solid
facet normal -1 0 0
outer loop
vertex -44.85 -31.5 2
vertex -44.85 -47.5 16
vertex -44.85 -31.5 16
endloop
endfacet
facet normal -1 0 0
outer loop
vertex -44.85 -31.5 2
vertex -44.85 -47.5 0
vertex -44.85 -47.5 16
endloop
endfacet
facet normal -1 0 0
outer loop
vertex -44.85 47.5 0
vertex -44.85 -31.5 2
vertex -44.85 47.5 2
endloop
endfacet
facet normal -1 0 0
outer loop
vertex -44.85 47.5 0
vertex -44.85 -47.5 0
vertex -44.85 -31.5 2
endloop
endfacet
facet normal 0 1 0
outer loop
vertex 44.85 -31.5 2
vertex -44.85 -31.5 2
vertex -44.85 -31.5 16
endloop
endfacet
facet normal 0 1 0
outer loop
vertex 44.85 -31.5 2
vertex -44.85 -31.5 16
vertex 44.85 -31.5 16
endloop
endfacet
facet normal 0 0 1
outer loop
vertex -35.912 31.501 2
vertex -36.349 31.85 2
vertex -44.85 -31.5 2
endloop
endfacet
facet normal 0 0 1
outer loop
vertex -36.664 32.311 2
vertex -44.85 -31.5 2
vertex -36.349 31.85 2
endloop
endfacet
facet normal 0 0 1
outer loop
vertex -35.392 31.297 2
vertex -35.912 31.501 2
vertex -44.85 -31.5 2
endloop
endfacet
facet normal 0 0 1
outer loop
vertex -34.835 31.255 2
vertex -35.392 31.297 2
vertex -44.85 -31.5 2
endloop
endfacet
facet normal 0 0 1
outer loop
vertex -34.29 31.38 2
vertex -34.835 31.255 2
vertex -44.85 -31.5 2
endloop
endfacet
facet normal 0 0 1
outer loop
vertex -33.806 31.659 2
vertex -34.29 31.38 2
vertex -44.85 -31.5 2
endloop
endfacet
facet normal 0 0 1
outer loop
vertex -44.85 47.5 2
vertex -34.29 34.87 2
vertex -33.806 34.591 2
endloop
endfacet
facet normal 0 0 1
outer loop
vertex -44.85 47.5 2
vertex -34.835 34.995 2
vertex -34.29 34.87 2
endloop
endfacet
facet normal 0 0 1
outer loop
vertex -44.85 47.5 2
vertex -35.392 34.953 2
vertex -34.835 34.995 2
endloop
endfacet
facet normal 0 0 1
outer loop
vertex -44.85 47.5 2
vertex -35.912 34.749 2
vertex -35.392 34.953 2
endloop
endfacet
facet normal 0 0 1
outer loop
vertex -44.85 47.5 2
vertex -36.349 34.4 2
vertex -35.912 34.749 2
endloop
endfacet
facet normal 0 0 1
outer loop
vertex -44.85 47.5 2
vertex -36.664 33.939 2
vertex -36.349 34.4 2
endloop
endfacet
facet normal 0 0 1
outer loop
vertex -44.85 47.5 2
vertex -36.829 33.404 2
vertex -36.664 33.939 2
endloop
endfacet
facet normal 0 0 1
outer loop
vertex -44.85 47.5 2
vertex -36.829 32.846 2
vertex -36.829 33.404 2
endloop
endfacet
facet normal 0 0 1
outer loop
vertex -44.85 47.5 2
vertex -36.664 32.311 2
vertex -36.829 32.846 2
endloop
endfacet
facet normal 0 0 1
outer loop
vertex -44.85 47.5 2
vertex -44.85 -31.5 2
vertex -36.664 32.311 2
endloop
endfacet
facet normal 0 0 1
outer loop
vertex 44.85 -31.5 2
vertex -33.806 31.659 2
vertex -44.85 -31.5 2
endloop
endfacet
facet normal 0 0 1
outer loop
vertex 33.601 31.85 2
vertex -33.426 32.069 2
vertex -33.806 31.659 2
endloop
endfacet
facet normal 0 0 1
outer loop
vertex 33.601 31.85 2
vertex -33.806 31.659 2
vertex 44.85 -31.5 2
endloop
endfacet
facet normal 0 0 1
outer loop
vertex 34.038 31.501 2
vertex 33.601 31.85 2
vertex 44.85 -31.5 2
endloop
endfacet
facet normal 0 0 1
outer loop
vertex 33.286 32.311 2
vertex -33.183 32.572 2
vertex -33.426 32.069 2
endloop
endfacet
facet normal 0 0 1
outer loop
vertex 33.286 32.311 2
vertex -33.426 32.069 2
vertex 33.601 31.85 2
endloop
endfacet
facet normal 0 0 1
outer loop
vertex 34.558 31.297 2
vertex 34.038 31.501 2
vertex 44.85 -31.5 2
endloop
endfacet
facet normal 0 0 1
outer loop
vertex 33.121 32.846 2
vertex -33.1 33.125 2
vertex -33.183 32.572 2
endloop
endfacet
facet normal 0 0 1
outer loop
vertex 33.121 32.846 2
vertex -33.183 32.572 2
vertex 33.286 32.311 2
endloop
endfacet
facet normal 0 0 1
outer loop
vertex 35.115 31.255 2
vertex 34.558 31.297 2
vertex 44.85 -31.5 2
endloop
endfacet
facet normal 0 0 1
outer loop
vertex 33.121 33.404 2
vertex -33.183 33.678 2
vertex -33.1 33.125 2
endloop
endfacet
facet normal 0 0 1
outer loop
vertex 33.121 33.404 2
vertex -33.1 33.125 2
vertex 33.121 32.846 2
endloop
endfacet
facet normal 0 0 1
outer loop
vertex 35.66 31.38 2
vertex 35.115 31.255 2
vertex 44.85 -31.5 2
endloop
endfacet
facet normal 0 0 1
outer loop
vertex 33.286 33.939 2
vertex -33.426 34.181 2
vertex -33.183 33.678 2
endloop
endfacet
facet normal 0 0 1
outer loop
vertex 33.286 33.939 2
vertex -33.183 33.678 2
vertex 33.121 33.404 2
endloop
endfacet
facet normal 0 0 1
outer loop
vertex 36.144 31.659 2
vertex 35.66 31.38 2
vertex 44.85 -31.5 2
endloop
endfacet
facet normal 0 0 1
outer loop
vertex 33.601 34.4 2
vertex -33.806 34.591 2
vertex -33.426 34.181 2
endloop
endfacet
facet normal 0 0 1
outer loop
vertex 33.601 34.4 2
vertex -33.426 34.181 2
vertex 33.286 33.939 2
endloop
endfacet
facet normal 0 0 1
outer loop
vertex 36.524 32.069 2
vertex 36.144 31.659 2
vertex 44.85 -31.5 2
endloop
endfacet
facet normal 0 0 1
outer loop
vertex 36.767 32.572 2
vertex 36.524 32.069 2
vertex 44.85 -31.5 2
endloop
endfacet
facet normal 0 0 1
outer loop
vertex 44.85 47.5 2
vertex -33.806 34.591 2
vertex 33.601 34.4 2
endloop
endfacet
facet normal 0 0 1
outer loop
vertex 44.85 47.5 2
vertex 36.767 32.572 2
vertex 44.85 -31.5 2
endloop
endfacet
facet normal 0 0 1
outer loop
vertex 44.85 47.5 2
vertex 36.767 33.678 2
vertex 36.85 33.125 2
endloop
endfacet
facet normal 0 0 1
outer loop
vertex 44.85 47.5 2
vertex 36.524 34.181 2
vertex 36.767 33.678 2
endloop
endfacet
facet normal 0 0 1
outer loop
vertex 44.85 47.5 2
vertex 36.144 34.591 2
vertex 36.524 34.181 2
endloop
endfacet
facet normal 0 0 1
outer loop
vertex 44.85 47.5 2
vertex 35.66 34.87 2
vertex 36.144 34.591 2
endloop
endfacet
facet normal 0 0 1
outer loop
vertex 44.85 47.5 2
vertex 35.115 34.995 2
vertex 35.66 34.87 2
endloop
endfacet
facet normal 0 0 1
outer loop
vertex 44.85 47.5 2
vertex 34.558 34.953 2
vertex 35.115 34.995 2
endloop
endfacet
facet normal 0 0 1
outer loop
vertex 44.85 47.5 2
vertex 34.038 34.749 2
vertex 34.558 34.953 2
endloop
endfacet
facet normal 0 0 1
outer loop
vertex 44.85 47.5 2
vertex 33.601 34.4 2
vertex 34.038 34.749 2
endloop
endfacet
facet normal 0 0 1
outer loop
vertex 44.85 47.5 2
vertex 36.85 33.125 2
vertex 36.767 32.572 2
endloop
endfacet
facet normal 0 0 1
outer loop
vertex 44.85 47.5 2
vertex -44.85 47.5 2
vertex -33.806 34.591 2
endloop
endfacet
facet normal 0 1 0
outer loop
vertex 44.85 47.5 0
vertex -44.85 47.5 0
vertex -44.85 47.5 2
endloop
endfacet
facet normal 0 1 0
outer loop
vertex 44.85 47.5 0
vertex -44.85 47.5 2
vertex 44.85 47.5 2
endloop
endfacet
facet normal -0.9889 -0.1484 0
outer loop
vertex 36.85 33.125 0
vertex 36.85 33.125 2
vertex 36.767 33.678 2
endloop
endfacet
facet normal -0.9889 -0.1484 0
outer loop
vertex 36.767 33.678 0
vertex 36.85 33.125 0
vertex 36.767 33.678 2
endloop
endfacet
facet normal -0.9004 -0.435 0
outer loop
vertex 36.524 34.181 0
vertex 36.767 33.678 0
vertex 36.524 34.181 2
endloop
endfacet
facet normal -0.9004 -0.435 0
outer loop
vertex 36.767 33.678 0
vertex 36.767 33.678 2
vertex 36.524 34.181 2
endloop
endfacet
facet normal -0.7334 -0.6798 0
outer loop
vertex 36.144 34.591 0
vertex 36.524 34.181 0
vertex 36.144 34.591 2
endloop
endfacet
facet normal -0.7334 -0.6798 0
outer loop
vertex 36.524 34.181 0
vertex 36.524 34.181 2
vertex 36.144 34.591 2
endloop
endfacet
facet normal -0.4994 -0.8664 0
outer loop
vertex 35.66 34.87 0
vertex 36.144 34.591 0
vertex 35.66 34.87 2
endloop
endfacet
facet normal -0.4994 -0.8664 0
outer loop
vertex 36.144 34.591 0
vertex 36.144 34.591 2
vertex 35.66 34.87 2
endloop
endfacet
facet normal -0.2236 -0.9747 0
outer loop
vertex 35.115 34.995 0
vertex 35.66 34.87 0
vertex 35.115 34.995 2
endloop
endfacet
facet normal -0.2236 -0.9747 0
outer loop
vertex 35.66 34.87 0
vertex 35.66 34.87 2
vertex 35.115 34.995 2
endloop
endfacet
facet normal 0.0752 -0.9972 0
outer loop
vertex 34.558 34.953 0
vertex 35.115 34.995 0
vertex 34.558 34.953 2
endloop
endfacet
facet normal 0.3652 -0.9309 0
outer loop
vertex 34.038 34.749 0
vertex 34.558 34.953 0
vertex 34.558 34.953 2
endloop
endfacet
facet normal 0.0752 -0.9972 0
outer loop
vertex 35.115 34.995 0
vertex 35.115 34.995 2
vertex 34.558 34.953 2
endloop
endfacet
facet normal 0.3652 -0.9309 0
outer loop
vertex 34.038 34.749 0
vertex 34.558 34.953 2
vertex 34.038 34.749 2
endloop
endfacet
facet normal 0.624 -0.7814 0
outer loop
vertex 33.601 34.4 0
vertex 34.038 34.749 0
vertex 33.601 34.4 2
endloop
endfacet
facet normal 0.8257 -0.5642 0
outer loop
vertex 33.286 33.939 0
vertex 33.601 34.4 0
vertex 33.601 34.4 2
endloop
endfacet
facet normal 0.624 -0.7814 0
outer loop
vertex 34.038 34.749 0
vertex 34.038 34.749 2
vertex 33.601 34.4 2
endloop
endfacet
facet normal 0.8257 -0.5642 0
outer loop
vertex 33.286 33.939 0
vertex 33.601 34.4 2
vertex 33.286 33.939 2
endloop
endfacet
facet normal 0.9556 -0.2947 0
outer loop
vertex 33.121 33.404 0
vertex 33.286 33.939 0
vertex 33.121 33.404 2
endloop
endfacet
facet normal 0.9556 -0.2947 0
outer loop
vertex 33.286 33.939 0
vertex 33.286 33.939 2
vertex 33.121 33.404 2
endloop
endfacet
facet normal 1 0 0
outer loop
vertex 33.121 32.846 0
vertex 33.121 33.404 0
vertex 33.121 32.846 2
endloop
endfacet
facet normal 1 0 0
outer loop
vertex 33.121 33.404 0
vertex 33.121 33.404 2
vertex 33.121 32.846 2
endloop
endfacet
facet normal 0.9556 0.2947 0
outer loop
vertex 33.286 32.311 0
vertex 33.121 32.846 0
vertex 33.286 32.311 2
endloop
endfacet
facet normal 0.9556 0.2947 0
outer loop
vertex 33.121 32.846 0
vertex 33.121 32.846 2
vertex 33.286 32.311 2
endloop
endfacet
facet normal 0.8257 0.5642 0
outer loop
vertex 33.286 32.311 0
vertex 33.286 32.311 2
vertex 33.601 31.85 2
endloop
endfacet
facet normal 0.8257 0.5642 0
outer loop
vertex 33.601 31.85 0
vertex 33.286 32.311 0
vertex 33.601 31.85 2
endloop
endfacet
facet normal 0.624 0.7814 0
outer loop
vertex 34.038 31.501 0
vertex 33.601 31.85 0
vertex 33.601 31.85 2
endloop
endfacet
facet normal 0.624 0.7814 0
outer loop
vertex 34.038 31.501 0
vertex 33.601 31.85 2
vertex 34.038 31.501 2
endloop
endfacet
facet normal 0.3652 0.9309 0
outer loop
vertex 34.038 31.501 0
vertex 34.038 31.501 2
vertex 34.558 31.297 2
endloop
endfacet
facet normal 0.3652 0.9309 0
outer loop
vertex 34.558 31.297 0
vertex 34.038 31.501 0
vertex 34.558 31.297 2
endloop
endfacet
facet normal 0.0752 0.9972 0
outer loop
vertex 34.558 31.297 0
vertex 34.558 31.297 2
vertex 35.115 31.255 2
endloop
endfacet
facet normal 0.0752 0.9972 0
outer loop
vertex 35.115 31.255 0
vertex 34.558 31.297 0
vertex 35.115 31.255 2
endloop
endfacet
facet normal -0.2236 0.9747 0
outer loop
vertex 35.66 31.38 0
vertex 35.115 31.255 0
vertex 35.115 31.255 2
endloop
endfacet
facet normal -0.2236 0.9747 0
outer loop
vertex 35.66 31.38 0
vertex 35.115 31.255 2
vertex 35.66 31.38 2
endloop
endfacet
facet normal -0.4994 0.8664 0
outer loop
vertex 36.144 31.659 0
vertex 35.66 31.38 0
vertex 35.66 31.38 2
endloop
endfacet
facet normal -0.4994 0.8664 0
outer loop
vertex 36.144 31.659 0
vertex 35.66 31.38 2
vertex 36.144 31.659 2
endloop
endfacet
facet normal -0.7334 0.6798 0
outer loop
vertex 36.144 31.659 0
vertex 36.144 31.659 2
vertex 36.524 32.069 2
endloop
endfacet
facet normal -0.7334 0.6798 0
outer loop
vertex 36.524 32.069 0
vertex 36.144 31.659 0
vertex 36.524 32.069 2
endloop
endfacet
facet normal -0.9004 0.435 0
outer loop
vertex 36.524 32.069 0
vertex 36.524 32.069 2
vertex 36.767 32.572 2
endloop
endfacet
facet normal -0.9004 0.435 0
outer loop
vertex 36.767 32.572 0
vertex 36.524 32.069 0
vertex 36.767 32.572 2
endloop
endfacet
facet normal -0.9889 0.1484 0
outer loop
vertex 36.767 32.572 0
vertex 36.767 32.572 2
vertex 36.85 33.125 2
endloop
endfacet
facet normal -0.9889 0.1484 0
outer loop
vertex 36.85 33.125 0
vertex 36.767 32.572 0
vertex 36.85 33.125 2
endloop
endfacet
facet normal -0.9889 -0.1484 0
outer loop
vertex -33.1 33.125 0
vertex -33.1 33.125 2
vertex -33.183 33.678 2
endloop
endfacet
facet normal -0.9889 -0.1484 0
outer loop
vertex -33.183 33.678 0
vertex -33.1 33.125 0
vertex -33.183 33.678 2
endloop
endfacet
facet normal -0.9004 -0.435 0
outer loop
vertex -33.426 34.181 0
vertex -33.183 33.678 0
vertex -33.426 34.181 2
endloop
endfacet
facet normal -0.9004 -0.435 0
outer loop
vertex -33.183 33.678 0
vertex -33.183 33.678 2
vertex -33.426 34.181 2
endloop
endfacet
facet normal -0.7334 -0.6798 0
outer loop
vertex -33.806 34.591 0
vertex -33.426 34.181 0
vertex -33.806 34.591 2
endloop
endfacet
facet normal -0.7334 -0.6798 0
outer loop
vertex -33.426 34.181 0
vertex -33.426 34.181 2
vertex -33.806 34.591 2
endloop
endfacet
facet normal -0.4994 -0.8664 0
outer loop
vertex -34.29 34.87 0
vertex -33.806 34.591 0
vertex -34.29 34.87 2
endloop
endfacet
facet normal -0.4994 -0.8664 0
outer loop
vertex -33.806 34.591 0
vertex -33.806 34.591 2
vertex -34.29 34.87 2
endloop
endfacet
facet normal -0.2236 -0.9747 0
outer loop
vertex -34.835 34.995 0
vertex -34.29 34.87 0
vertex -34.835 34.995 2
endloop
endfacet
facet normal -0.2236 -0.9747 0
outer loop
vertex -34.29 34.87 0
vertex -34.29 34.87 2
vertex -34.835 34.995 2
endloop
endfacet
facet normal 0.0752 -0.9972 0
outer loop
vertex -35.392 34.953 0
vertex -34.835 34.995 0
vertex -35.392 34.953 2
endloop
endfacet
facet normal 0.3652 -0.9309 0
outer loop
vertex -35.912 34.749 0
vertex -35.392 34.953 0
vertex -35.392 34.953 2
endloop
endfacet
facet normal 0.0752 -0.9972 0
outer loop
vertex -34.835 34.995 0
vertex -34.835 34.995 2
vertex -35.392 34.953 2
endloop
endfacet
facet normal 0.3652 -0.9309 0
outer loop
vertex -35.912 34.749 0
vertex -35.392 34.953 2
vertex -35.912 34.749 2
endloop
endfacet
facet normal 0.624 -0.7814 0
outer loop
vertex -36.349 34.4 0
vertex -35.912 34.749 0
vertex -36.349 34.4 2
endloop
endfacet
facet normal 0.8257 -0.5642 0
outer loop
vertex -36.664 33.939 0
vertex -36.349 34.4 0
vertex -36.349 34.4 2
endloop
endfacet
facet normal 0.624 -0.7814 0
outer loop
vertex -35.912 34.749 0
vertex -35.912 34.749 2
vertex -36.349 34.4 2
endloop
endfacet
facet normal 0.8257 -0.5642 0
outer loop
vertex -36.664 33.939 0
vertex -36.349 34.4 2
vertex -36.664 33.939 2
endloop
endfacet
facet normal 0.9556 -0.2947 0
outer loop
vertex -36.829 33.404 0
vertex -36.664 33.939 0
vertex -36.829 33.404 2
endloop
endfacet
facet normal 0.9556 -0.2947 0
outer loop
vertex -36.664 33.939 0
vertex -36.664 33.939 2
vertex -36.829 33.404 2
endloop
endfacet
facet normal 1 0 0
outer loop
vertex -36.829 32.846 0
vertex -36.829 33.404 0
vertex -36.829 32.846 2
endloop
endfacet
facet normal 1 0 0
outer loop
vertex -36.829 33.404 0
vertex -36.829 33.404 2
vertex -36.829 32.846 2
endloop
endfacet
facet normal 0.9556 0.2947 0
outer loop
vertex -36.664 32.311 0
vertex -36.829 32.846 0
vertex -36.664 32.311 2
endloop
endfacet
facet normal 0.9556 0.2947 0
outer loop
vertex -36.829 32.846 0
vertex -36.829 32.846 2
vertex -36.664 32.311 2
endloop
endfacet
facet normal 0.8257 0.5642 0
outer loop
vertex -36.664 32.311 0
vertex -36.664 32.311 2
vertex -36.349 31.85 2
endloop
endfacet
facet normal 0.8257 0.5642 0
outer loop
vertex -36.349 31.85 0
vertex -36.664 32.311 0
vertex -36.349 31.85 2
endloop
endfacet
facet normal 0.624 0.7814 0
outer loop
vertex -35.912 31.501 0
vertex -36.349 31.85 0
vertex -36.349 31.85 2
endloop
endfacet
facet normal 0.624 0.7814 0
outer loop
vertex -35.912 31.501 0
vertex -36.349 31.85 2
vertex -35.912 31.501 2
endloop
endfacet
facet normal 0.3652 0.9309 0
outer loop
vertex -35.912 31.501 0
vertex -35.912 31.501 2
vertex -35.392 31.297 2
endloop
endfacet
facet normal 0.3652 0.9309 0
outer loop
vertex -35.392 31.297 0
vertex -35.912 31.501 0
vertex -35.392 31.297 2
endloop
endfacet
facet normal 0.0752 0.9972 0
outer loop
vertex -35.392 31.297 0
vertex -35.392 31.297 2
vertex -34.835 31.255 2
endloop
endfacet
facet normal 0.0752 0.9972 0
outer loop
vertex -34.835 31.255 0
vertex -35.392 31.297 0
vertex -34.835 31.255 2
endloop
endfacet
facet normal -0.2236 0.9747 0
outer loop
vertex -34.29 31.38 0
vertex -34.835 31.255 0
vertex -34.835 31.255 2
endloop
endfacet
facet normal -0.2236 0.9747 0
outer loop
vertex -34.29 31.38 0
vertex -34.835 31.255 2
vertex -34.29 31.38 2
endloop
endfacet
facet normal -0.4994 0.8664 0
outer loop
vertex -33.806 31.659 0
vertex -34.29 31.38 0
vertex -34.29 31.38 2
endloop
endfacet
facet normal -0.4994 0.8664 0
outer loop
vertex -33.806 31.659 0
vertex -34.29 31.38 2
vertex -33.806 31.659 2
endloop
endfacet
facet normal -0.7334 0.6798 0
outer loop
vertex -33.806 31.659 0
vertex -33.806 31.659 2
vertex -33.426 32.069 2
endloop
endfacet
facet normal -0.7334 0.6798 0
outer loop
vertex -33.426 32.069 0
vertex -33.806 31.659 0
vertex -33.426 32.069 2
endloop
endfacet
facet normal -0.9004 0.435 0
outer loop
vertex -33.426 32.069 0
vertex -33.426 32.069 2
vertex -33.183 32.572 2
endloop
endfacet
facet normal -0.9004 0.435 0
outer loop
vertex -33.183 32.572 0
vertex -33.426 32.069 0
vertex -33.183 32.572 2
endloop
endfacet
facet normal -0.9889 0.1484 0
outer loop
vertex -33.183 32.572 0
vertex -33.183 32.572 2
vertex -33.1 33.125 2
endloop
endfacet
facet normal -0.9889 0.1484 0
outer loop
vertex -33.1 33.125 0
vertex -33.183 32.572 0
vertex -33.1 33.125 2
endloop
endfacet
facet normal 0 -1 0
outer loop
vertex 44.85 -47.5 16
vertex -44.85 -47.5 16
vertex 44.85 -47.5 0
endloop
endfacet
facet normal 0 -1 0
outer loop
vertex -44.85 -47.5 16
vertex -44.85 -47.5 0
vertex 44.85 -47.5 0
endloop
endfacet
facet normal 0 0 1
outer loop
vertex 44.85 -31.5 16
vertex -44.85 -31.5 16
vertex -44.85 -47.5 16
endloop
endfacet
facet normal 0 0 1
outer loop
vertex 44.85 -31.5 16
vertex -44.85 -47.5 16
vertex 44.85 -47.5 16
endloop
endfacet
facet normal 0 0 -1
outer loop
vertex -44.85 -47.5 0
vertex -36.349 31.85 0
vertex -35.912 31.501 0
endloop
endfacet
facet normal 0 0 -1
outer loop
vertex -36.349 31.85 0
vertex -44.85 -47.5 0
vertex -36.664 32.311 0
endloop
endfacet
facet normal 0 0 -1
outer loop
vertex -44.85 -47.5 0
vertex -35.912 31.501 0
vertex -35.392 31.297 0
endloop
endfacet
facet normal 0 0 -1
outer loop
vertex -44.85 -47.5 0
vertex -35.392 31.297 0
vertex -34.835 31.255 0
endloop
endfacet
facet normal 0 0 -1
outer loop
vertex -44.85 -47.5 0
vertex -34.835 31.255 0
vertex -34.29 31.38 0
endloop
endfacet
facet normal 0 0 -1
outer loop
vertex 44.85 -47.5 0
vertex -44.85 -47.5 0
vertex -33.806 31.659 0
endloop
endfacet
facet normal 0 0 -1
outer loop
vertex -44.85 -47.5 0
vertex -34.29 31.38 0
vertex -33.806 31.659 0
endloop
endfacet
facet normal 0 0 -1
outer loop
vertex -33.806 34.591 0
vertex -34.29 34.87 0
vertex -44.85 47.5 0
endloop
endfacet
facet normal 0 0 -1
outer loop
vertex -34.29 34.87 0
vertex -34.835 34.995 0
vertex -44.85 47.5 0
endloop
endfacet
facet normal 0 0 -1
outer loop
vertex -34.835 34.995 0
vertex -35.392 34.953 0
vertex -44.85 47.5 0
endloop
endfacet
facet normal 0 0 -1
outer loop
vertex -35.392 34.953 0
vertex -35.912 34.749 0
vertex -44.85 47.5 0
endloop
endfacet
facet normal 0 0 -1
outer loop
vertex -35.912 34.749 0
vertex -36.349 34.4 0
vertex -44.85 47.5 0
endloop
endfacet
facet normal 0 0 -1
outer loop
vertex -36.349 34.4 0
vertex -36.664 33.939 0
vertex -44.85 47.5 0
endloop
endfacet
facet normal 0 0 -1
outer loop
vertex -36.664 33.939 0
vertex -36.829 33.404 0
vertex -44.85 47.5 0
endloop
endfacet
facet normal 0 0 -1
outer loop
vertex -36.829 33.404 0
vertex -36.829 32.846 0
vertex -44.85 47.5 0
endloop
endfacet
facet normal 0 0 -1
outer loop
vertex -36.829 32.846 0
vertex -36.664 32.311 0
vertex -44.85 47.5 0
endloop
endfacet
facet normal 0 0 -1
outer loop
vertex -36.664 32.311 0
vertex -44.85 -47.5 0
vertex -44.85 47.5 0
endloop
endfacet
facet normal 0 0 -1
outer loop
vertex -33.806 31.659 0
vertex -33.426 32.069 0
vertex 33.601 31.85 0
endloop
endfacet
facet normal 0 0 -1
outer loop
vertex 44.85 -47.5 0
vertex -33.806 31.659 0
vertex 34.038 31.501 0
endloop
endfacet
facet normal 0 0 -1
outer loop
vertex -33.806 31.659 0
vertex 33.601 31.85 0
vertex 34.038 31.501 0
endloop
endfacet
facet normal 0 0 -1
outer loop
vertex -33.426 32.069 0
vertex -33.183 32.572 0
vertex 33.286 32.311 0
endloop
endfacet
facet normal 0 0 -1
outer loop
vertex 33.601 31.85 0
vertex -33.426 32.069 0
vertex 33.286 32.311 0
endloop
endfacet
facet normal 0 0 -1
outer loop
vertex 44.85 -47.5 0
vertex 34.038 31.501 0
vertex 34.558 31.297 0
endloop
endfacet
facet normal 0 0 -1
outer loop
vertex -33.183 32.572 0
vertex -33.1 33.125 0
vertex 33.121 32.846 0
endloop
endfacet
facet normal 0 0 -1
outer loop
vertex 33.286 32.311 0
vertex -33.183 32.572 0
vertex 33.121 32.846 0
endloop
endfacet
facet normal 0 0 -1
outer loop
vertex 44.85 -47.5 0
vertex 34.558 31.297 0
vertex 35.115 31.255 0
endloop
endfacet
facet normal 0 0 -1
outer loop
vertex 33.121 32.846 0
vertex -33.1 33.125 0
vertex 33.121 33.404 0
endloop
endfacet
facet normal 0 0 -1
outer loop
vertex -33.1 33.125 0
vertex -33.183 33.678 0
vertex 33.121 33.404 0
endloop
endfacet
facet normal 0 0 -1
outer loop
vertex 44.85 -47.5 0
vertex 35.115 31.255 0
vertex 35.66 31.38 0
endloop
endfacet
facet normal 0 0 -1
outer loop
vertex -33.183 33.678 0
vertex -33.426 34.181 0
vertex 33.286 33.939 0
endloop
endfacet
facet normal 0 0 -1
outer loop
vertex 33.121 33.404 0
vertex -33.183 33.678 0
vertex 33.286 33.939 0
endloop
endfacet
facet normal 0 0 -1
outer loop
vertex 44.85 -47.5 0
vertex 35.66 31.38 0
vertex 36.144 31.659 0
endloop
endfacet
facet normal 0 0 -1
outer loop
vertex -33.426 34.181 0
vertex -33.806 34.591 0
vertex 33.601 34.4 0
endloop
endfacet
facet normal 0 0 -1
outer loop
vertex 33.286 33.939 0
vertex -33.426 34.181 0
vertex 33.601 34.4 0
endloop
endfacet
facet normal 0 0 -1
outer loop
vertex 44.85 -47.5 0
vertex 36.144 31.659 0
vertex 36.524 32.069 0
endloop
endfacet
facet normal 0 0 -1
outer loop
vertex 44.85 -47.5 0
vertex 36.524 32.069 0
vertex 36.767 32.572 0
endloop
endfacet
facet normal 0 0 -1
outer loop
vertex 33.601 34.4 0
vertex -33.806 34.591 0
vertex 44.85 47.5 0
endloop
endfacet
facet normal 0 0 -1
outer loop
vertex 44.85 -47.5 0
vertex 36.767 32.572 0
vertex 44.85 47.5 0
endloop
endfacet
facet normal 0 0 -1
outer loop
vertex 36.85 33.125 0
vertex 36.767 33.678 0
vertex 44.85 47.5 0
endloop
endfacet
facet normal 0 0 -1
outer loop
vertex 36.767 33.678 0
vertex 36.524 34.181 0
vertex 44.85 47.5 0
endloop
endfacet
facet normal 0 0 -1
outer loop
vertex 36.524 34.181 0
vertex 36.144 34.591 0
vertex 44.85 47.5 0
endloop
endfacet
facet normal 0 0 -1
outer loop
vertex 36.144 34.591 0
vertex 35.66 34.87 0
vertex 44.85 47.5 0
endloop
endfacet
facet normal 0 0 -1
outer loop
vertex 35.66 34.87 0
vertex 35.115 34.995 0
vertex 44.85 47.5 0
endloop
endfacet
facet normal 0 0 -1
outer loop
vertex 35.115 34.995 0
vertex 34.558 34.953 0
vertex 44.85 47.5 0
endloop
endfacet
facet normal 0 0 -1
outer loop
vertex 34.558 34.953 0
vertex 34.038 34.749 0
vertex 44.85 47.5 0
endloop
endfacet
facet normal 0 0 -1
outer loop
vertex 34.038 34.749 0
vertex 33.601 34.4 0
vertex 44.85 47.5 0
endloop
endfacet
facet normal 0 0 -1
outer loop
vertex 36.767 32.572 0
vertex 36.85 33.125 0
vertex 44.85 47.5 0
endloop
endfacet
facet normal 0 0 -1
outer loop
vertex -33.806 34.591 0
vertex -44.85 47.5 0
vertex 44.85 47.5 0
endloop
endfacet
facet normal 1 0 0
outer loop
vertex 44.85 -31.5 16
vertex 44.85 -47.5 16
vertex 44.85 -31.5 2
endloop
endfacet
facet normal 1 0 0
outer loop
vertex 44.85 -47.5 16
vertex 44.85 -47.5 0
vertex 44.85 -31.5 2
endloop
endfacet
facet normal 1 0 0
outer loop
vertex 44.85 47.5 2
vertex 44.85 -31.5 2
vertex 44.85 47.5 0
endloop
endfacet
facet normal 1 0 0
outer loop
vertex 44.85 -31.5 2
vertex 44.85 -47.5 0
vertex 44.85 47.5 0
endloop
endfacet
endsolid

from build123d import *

# Parameters (mm, degrees)
F0_W     = 89.7
F0_H     = 95
F1_DEPTH = 2
F2_R     = 1.875
F3_DEPTH = 2.001
F4_W     = 89.7
F4_H     = 16
F5_DEPTH = 14


with BuildPart() as f1:
    # F0 (on Top) → F1 (new body)
    with BuildSketch(Plane.XY):
        Rectangle(F0_W, F0_H)
    extrude(amount=F1_DEPTH)

    # F2 (on face) → F3 (cut, through all)
    with BuildSketch(Plane.XY.offset(2)):
        with Locations((-34.975, 33.125)):
            Circle(F2_R)
        with Locations((34.975, 33.125)):
            Circle(F2_R)
    extrude(amount=-F3_DEPTH, mode=Mode.SUBTRACT)

    # F4 (on face) → F5 (join)
    with BuildSketch(Plane.XY.offset(2)):
        with Locations((0, -39.5)):
            Rectangle(F4_W, F4_H)
    extrude(amount=F5_DEPTH)


solid = f1.part
